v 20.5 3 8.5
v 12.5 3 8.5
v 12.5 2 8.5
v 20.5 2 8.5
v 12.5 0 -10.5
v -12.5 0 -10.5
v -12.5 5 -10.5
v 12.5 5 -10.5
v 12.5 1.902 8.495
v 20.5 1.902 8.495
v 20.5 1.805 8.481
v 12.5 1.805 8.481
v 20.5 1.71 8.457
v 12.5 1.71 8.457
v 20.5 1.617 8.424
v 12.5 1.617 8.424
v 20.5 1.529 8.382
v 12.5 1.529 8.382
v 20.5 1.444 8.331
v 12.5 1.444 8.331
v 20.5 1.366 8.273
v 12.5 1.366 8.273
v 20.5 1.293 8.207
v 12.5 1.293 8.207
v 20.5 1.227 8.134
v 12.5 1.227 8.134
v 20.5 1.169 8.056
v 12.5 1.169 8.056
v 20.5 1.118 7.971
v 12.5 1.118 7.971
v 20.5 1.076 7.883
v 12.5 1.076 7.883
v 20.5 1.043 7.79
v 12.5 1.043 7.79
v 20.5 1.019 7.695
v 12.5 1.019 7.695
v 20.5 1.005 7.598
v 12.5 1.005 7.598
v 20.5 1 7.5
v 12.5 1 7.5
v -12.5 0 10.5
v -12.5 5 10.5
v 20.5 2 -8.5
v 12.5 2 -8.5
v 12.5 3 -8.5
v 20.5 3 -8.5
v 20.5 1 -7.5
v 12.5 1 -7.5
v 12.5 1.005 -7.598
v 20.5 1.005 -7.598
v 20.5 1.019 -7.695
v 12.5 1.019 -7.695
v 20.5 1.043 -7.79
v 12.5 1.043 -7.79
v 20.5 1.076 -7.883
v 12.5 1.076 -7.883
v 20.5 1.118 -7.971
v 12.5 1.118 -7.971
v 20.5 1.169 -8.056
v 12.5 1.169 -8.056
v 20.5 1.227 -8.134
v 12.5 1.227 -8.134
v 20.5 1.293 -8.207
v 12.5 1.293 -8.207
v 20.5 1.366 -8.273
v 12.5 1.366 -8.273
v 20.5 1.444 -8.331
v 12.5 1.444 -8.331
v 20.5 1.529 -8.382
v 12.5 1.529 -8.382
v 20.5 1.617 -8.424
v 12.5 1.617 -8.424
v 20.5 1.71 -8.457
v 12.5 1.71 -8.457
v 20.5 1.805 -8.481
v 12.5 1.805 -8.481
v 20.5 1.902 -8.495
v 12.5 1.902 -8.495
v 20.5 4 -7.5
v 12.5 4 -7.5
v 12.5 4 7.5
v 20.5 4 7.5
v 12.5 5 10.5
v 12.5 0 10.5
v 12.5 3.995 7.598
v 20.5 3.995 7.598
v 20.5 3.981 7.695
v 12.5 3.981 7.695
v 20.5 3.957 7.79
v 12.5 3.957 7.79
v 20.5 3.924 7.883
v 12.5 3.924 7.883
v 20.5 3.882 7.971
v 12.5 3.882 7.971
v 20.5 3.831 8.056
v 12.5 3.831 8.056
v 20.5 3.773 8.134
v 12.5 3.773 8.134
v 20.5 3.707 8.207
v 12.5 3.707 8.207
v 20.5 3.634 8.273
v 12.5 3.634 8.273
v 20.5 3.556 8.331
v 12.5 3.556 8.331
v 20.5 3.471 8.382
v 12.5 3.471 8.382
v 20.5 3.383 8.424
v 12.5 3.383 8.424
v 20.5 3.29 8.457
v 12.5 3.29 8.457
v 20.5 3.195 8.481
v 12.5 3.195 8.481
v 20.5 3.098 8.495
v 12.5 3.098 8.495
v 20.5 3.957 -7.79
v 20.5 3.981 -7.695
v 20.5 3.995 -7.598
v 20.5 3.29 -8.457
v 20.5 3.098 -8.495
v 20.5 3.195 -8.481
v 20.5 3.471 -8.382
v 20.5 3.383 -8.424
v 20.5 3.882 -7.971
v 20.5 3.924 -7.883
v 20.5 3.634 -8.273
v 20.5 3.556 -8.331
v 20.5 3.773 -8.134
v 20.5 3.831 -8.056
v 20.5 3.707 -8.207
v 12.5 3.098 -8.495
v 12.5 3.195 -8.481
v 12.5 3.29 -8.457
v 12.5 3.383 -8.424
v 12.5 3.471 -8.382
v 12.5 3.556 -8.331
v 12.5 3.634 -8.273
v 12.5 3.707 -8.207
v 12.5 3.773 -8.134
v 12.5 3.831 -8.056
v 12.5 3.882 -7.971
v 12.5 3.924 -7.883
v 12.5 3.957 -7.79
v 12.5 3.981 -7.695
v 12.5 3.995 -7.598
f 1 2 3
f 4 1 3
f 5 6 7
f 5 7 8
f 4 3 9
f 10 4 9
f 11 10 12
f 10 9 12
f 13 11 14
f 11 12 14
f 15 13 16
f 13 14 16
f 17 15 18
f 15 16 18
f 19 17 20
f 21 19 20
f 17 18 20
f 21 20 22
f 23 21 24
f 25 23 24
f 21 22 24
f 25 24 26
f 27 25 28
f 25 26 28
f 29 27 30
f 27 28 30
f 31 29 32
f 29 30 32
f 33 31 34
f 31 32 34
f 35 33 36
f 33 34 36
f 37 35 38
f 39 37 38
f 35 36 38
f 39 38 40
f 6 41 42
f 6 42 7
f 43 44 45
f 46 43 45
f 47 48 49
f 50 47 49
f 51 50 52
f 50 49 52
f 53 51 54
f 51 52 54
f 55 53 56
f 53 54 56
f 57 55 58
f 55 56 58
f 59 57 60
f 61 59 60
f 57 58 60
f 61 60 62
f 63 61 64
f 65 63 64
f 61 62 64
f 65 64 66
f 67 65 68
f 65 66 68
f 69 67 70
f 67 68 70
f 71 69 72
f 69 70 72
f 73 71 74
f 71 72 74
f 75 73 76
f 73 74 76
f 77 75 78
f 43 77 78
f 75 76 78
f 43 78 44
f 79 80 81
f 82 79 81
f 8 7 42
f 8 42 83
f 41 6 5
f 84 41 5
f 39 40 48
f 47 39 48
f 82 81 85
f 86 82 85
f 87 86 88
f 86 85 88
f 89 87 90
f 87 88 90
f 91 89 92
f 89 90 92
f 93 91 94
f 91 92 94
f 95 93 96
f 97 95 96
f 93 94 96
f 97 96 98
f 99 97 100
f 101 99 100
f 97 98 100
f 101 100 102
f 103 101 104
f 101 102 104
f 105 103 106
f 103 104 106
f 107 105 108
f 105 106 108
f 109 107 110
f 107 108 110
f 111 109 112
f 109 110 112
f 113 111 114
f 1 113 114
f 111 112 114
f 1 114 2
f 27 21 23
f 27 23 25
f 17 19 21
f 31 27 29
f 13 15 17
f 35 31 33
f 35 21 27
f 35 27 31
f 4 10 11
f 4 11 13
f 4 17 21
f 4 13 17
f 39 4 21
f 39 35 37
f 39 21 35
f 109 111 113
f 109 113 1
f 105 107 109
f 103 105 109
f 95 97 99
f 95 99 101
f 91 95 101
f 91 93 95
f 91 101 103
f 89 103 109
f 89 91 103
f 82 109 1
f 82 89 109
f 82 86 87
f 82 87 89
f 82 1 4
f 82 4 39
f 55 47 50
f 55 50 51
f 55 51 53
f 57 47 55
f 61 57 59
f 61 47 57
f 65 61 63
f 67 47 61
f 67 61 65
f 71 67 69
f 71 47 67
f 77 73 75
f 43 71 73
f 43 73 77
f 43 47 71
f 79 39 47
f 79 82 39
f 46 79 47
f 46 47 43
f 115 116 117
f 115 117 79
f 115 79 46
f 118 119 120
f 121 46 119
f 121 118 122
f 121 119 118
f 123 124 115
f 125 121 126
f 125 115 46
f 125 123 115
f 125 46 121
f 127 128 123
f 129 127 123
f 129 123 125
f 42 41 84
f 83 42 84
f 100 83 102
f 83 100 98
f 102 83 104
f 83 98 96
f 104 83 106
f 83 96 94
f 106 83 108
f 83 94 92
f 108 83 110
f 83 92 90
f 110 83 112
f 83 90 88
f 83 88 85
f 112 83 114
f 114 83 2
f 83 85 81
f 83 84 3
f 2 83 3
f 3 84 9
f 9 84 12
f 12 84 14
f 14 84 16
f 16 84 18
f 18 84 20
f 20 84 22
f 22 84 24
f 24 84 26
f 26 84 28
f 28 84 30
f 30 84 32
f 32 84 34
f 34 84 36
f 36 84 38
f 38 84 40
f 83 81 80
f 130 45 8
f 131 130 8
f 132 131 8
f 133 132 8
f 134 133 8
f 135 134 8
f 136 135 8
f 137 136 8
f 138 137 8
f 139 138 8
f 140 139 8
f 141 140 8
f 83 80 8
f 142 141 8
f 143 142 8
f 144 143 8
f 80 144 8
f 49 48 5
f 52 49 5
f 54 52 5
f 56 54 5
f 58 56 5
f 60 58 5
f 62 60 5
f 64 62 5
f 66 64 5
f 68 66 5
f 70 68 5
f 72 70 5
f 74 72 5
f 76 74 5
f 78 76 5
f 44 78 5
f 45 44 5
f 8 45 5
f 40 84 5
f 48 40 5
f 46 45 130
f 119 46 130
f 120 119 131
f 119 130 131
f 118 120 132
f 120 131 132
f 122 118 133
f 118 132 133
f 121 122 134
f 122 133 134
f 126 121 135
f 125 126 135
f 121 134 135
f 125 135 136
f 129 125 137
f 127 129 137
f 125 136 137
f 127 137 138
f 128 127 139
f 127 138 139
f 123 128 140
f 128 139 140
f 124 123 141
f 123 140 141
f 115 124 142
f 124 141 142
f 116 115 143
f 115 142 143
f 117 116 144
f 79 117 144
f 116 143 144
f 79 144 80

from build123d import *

# Parameters (mm, degrees)
SKETCH1_W           = 25
SKETCH1_H           = 21
BOSS_EXTRUDE1_DEPTH = 5
BOSS_EXTRUDE2_DEPTH = 8


with BuildPart() as part:
    # Sketch1 → Boss-Extrude1 (new body)
    with BuildSketch(Plane(origin=(0, 0, 0), x_dir=(1, 0, 0), z_dir=(0, 1, 0))):
        Rectangle(SKETCH1_W, SKETCH1_H)
    extrude(amount=BOSS_EXTRUDE1_DEPTH)

    # Sketch2 → Boss-Extrude2 (add)
    with BuildSketch(Plane(origin=(12.5, 0, 0), x_dir=(0, 0, -1), z_dir=(1, 0, 0))):
        with BuildLine():
            Line((-7.5, 1), (-6.3, 1))
            Line((-6.3, 1), (6.3, 4))
            Line((6.3, 4), (-7.5, 4))
            ThreePointArc((-7.5, 4), (-8.207106781, 3.707106781), (-8.5, 3))
            Line((-8.5, 3), (-8.5, 2))
            ThreePointArc((-8.5, 2), (-8.207106781, 1.292893219), (-7.5, 1))
        make_face()
        with BuildLine():
            Line((6.3, 4), (-6.3, 1))
            Line((-6.3, 1), (7.5, 1))
            ThreePointArc((7.5, 1), (8.207106781, 1.292893219), (8.5, 2))
            Line((8.5, 2), (8.5, 3))
            ThreePointArc((8.5, 3), (8.207106781, 3.707106781), (7.5, 4))
            Line((7.5, 4), (6.3, 4))
        make_face()
    extrude(amount=BOSS_EXTRUDE2_DEPTH)


solid = part.part
